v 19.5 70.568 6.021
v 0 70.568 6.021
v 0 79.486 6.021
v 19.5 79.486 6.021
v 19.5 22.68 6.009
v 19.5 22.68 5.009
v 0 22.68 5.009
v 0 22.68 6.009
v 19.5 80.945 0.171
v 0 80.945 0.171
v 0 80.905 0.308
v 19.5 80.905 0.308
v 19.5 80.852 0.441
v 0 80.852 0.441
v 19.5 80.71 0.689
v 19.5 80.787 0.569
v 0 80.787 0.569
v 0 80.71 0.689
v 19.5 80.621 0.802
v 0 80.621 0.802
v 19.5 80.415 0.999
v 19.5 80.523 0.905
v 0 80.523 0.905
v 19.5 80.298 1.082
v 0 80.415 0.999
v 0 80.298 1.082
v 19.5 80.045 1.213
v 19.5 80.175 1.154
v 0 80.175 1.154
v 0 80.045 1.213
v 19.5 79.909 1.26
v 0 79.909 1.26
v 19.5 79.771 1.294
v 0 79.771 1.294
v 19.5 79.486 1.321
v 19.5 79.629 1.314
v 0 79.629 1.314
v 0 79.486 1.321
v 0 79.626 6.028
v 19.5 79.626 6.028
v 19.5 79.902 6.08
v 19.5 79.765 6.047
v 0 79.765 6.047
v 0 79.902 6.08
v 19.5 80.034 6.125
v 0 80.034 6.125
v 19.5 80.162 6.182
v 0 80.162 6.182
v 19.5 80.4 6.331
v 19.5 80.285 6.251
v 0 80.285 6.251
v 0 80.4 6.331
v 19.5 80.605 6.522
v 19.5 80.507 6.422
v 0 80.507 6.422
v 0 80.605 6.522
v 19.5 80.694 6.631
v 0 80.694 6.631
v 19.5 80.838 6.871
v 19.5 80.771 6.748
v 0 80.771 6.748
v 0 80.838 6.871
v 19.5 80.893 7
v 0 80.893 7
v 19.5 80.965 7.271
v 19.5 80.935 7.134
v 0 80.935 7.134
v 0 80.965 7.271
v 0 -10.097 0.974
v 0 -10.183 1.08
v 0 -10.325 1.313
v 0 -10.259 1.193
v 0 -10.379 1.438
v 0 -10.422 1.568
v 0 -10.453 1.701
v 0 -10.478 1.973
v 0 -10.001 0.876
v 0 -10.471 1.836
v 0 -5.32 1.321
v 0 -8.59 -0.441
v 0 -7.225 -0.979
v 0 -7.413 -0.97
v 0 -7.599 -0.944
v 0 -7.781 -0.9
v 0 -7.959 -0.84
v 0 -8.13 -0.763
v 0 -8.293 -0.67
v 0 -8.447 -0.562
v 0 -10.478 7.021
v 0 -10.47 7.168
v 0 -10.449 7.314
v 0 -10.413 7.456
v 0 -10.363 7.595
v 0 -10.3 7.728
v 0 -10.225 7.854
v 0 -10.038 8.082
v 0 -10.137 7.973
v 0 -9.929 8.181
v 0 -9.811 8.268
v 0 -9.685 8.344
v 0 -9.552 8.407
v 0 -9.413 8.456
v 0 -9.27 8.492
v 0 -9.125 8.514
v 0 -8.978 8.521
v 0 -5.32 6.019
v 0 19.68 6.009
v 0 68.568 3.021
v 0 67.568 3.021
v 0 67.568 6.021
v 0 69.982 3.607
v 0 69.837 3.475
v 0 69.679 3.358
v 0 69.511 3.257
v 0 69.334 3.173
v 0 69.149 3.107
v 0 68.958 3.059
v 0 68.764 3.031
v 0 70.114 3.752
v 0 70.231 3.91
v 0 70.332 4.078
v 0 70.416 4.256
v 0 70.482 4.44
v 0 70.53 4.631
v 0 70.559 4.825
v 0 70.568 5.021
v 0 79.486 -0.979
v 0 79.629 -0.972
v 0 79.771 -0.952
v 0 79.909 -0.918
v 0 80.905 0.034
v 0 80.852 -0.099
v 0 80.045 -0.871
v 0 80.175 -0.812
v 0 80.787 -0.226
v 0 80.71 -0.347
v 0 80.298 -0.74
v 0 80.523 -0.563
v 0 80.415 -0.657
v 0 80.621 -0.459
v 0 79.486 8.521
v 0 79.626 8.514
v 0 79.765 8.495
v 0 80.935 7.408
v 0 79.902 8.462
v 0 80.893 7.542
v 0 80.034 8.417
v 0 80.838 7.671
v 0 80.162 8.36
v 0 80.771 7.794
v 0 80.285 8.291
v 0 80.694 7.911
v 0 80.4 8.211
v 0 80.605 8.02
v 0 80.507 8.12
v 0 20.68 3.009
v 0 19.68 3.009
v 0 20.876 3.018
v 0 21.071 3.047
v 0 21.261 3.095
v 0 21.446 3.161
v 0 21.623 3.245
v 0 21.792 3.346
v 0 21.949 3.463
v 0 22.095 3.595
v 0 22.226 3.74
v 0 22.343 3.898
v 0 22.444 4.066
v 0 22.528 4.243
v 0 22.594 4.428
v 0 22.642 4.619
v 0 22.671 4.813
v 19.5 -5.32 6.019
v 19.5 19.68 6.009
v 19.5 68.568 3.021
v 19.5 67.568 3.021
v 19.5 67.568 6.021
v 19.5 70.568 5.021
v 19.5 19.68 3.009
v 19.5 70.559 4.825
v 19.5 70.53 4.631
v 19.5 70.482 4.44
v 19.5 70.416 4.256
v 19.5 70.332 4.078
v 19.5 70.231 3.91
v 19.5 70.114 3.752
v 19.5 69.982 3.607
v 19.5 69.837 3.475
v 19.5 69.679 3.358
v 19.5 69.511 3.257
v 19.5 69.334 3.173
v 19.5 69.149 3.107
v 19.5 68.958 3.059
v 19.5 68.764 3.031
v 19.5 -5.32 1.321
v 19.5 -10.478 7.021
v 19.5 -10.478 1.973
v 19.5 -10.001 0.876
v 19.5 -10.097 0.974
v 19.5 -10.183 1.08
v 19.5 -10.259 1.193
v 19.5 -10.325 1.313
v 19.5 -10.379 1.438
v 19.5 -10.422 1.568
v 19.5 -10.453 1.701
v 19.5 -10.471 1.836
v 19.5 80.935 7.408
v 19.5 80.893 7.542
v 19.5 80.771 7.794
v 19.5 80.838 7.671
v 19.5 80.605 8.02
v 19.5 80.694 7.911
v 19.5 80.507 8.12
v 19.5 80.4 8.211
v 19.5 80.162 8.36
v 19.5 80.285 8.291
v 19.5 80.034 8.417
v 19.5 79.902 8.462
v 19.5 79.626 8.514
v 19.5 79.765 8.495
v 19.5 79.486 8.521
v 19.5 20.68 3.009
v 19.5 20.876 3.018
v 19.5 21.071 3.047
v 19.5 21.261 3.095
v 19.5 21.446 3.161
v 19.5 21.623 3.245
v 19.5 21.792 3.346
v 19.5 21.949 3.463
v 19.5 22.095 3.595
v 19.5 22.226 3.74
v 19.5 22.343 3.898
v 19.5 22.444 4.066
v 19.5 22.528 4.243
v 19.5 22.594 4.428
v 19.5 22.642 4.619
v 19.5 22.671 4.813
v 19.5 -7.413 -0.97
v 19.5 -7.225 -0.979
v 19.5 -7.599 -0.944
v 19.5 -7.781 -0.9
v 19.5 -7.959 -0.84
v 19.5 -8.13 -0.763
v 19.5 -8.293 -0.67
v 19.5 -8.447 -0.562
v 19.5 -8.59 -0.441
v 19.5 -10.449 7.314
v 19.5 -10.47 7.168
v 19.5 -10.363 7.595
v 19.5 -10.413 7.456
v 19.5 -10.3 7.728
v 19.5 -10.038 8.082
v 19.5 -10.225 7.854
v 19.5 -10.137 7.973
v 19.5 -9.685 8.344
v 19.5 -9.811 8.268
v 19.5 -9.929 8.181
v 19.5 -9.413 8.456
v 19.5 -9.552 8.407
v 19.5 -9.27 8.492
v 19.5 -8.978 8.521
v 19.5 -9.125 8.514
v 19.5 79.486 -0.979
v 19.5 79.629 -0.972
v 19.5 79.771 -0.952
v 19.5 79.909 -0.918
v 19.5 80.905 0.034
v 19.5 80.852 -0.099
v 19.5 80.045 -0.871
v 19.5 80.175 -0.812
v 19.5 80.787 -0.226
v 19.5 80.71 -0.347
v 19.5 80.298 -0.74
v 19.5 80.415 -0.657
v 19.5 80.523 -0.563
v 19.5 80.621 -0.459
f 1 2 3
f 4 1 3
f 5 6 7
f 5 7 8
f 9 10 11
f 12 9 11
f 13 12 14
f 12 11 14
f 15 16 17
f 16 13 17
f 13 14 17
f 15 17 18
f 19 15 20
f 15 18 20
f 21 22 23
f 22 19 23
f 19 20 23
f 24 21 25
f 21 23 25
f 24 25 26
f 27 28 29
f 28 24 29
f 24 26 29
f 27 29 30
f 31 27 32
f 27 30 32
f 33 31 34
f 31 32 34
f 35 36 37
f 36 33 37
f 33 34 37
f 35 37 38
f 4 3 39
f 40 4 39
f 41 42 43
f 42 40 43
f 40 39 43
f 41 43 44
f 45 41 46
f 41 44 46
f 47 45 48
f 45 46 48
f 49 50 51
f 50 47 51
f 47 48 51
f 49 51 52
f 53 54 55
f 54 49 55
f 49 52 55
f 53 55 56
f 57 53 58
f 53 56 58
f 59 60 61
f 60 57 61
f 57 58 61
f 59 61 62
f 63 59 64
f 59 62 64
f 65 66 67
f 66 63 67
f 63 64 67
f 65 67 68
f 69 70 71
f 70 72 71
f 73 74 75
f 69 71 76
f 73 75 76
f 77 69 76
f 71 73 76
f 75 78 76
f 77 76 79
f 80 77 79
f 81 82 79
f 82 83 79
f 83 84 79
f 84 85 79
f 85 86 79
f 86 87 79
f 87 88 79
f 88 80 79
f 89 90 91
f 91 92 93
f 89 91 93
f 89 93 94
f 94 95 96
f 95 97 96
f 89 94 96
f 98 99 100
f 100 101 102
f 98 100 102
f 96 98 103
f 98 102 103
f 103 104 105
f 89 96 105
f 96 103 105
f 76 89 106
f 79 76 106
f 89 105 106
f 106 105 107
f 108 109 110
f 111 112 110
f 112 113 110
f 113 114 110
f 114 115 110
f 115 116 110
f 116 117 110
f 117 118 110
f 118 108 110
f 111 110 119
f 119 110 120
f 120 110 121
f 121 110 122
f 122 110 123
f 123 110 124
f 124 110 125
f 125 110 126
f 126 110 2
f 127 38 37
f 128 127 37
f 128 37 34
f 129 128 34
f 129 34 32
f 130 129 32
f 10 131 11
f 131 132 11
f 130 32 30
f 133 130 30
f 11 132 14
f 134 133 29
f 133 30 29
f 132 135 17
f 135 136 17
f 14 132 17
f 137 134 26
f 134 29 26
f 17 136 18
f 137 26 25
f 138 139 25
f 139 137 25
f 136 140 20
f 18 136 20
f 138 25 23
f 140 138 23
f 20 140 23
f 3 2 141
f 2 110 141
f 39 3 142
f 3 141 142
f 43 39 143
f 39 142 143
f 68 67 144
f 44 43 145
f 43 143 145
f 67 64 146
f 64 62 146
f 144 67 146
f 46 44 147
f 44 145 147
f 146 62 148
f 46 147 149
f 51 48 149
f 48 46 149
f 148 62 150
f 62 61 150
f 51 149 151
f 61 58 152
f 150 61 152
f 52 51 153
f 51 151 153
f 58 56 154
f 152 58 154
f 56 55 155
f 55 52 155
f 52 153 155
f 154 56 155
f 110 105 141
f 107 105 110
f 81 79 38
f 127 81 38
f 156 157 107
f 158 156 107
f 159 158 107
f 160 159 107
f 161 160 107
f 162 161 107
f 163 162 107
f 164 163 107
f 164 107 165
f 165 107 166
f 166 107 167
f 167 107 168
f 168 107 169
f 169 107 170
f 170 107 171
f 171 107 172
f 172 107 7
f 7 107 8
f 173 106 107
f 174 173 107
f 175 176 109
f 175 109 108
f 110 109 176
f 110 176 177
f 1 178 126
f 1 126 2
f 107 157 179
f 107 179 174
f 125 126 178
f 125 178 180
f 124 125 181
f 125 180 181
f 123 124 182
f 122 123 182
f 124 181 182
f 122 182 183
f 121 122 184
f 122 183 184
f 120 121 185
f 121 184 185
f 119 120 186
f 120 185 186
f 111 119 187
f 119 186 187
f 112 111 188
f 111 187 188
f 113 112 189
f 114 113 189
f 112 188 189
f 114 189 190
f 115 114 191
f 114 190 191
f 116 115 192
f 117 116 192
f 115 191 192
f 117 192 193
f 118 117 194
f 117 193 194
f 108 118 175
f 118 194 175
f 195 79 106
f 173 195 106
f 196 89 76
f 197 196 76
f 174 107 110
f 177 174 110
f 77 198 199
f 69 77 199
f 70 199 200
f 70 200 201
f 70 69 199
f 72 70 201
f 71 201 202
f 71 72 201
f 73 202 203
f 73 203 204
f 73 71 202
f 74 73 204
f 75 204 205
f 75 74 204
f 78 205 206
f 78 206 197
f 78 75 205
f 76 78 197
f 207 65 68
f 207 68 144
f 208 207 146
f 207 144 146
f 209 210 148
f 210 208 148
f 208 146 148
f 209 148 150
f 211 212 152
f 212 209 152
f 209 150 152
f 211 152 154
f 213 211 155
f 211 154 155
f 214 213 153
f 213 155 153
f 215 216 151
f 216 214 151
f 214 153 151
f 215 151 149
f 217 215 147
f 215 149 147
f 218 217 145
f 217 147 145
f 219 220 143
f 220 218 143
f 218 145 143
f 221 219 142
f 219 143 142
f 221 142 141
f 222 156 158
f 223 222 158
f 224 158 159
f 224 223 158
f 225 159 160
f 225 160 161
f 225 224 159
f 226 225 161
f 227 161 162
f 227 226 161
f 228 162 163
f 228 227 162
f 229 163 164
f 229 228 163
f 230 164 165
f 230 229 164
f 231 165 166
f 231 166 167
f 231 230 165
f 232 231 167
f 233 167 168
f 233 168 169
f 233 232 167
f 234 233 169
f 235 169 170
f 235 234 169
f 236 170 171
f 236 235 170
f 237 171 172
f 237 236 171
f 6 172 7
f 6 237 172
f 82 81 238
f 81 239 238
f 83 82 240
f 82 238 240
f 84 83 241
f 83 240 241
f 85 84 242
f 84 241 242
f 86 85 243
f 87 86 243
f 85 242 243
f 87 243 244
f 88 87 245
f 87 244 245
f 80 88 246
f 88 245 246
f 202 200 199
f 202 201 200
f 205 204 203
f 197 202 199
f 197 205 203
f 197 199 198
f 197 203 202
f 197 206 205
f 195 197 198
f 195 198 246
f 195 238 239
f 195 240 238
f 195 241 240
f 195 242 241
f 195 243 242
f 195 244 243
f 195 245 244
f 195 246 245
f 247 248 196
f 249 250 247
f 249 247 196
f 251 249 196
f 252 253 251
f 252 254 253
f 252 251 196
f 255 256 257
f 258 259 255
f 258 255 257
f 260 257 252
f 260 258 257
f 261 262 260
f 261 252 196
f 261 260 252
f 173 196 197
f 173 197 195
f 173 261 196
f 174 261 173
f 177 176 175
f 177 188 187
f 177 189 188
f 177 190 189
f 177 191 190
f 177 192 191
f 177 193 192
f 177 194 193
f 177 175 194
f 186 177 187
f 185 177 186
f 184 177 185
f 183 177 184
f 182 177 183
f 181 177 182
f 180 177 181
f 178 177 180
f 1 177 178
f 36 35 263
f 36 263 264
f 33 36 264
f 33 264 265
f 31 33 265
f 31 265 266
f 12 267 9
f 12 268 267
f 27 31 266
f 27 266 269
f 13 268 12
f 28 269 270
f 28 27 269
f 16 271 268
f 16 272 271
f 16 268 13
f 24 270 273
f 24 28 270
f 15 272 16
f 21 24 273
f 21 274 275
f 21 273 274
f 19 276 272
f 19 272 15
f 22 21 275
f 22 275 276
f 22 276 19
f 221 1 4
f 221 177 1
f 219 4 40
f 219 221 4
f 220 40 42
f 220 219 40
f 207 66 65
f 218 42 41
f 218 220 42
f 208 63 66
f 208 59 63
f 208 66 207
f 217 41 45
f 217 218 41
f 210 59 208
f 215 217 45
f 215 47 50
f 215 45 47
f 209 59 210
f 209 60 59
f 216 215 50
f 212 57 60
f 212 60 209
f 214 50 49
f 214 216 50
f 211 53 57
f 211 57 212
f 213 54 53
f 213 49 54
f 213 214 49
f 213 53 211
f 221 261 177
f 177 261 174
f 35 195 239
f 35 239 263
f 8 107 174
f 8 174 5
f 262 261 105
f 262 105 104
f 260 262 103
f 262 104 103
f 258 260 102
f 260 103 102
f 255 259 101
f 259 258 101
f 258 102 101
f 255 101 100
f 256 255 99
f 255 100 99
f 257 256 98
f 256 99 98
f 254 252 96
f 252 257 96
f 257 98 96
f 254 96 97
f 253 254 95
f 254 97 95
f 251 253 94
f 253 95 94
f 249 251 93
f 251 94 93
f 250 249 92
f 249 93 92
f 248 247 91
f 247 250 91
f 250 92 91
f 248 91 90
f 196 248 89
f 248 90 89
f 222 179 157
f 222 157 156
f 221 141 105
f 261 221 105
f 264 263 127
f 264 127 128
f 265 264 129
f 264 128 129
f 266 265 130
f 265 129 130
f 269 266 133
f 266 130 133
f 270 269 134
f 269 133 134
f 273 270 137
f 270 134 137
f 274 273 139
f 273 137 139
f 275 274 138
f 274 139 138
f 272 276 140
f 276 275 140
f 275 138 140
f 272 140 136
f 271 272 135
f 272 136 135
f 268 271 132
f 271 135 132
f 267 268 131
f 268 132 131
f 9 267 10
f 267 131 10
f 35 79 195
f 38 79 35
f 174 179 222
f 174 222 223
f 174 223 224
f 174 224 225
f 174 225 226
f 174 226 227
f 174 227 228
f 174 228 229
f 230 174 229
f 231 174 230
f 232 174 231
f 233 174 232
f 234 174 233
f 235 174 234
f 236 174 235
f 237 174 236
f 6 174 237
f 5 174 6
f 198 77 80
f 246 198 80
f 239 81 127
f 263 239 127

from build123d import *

# Parameters (mm, degrees)
F0_W        = 2.6942476507
F0_H        = 2.3
F0_W_2      = 86.3057523493
F0_H_2      = 2.5
F0_W_3      = 3
F0_H_3      = 3
F1_DEPTH    = 19.5
F2_T1_DEPTH = 27
F2_T3_DEPTH = 22.7585454732
F3_R        = 2
F3_2_R      = 2


# Not quite as in the source:
# - a fillet or chamfer that OpenCascade refuses, or shapes differently, is made with other operations: its cross-section is extruded or revolved along the edge and cut away or added


with BuildPart() as f1:
    # F0 (on Right) → F1 (new body)
    with BuildSketch(Plane.YZ):
        Polygon((-8.0138755839, 6.0200582189), (-8.0138755839, 1.3210557405), (-5.3196279332, 1.3210557405), (-5.3196279332, 6.0189673179), align=None)
        with Locations((-6.6667517586, 0.1710557405)):
            Rectangle(F0_W, F0_H)
        Polygon((-8.0138755839, -0.9789442595), (-8.0138755839, 1.3210557405), (-8.0138755839, 6.0200582189), (-10.4775000364, 6.0210557405), (-10.4775000364, 1.3210557405), align=None)
        with Locations((37.8332482414, 0.1710557405)):
            Rectangle(F0_W_2, F0_H)
        Polygon((-10.4775000364, 6.0210557405), (-8.0138755839, 6.0200582189), (-8.0138755839, 6.0210557405), align=None)
        Polygon((-8.0138755839, 6.0210557405), (-8.0138755839, 6.0200582189), (-5.3196279332, 6.0189673179), (-5.3196279332, 6.0210557405), align=None)
        Polygon((-5.3196279332, 6.0210557405), (-5.3196279332, 6.0189673179), (19.6803720668, 6.0088448171), (19.6803689531, 6.0210557405), (-2.3196279332, 6.0210557405), align=None)
        Polygon((-10.4775000364, 6.0210557405), (-8.0138755839, 6.0210557405), (-8.0138755839, 8.5210557405), (-10.4775000364, 8.5210557405), (-10.4775000364, 6.8358753532), align=None)
        with Locations((-6.6667517586, 7.2710557405)):
            Rectangle(F0_W, F0_H_2)
        with Locations((-3.8196279332, 7.2710557405)):
            Rectangle(F0_W_3, F0_H_2)
        Polygon((19.6803689531, 6.0210557405), (19.6803720668, 6.0088448171), (67.5681829453, 6.0210557405), align=None)
        Polygon((-2.3196279332, 8.5210557405), (-2.3196279332, 6.0210557405), (19.6803689531, 6.0210557405), (19.6797314776, 8.5210557405), align=None)
        Polygon((19.6803689531, 6.0210557405), (67.5681829453, 6.0210557405), (70.5681829453, 6.0210557405), (80.9861244161, 6.0210557405), (80.9861244161, 8.5210557405), (19.6797314776, 8.5210557405), align=None)
        with Locations((69.0681829453, 4.5210557405)):
            Rectangle(F0_W_3, F0_H_3)
    extrude(amount=F1_DEPTH)

    # F2: fillet of radius 1.5 on 6 edges, made by hand

    # F2_s2 → F2_t1 (cut)
    with BuildSketch(Plane.YZ.offset(-3.75)):
        with BuildLine():
            ThreePointArc((-8.9775000364, 8.5210557405), (-10.0381602081, 8.0817159123), (-10.4775000364, 7.0210557405))
            Line((-10.4775000364, 7.0210557405), (-10.4775000364, 8.5210557405))
            Line((-10.4775000364, 8.5210557405), (-8.9775000364, 8.5210557405))
        make_face()
        with BuildLine():
            ThreePointArc((80.9861244161, 7.0210557405), (80.5467845879, 8.0817159123), (79.4861244161, 8.5210557405))
            Line((79.4861244161, 8.5210557405), (80.9861244161, 8.5210557405))
            Line((80.9861244161, 8.5210557405), (80.9861244161, 7.0210557405))
        make_face()
        with BuildLine():
            ThreePointArc((79.4861244161, 6.0210557405), (80.5467845879, 6.4603955687), (80.9861244161, 7.5210557405))
            Line((80.9861244161, 7.5210557405), (80.9861244161, 6.0210557405))
            Line((80.9861244161, 6.0210557405), (79.4861244161, 6.0210557405))
        make_face()
        with BuildLine():
            ThreePointArc((80.9861244161, -0.1789442595), (80.5467845879, 0.8817159123), (79.4861244161, 1.3210557405))
            Line((79.4861244161, 1.3210557405), (80.9861244161, 1.3210557405))
            Line((80.9861244161, 1.3210557405), (80.9861244161, -0.1789442595))
        make_face()
        with BuildLine():
            ThreePointArc((79.4861244161, -0.9789442595), (80.5467845879, -0.5396044313), (80.9861244161, 0.5210557405))
            Line((80.9861244161, 0.5210557405), (80.9861244161, -0.9789442595))
            Line((80.9861244161, -0.9789442595), (79.4861244161, -0.9789442595))
        make_face()
    extrude(amount=F2_T1_DEPTH, mode=Mode.SUBTRACT)

    # F2_s4 → F2_t3 (cut)
    with BuildSketch(Plane.YZ.offset(-1.6292727366)):
        with BuildLine():
            ThreePointArc((-10.0011242018, 0.8763189551), (-10.3532609618, 1.3750342303), (-10.4775000364, 1.9727648351))
            Line((-10.4775000364, 1.9727648351), (-10.4775000364, 1.3210557405))
            Line((-10.4775000364, 1.3210557405), (-10.0011242018, 0.8763189551))
        make_face()
    extrude(amount=F2_T3_DEPTH, mode=Mode.SUBTRACT)

    # F3
    f3_edges = [f1.edges().sort_by_distance(p)[0] for p in [
        (9.75, -8.013876, -0.978944),
        (9.75, 70.568183, 3.021056),
    ]]
    fillet(f3_edges, radius=F3_R)


with BuildPart() as f1b:
    # F0 (on Right) → F1, piece 2 (new body)
    with BuildSketch(Plane.YZ):
        with Locations((21.1803720668, 4.5088448171)):
            Rectangle(F0_W_3, F0_H_3)
    extrude(amount=F1_DEPTH)

    # F3#2
    f3_2_edges = [f1b.edges().sort_by_distance(p)[0] for p in [
        (9.75, 22.680372, 3.008845),
    ]]
    fillet(f3_2_edges, radius=F3_2_R)


solid = Compound([f1.part, f1b.part])
